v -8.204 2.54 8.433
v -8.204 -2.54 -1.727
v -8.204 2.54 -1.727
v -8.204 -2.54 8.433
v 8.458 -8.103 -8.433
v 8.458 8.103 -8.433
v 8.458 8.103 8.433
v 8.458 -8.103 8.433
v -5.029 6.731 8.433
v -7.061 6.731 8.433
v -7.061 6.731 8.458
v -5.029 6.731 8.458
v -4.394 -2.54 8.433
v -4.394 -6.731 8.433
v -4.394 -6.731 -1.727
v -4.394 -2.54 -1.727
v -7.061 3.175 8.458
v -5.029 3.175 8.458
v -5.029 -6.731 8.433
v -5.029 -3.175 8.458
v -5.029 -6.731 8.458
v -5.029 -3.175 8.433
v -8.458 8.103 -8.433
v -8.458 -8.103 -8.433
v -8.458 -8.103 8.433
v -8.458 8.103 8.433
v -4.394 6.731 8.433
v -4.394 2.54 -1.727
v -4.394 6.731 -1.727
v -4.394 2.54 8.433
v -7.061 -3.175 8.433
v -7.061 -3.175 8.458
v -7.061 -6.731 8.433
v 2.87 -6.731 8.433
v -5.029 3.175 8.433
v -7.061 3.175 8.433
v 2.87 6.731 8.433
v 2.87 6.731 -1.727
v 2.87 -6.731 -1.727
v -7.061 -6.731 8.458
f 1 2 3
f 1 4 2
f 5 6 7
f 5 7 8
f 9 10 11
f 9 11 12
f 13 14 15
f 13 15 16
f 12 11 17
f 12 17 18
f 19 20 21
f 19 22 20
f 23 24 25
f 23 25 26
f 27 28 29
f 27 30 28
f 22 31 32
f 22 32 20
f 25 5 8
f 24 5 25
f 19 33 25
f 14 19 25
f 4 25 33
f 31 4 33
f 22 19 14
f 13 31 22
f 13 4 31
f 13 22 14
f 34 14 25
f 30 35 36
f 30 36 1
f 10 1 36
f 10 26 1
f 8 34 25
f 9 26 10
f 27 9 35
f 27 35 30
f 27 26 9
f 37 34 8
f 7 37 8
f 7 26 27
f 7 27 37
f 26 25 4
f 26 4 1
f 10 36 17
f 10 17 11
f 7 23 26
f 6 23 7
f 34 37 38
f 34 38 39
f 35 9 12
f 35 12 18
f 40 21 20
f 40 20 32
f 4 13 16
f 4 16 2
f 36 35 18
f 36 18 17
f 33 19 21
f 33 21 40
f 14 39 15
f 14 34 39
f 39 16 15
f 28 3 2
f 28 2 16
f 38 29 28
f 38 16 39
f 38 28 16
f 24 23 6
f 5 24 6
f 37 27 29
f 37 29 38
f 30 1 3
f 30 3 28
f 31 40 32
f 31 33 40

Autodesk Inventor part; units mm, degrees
ref_plane "YZ Plane" through (0, 0, 0) normal (1, 0, 0) x (0, 1, 0)
ref_plane "XZ Plane" through (0, 0, 0) normal (0, 1, 0) x (-1, 0, 0)
ref_plane "XY Plane" through (0, 0, 0) normal (0, 0, 1) x (1, 0, 0)
sketch "Sketch1" plane through (0, 0, 0) normal (0, 0, 1) x (1, 0, 0)
  line L0 (-8.4582, 8.1026) -> (8.4582, 8.1026)
  line L1 (8.4582, 8.1026) -> (8.4582, -8.1026)
  line L2 (8.4582, -8.1026) -> (-8.4582, -8.1026)
  line L3 (-8.4582, -8.1026) -> (-8.4582, 8.1026)
  line L4 (0, 0) -> (0, 8.1026) construction
  line L5 (0, 0) -> (0, -8.1026) construction
  line L6 (0, 0) -> (-8.4582, 0) construction
  line L7 (0, 0) -> (8.4582, 0) construction
  dimension "d0" = 16.9164
  dimension "d1" = 16.2052
extrude "Extrusion1" add sketch "Sketch1" along normal mid plane 16.8656
sketch "Sketch2" plane through (0, 0, 8.4328) normal (0, 0, 1) x (1, 0, 0)
  line L0 (8.4582, 8.1026) -> (8.4582, -8.1026) projected
  line L1 (-8.4582, 8.1026) -> (8.4582, 8.1026) projected
  line L2 (-8.4582, -8.1026) -> (-8.4582, 8.1026) projected
  line L3 (8.4582, -8.1026) -> (-8.4582, -8.1026) projected
  line L4 (-8.2042, -2.54) -> (-8.2042, 2.54)
  line L5 (-8.2042, 2.54) -> (-4.3942, 2.54)
  line L6 (-4.3942, 2.54) -> (-4.3942, 6.731)
  line L7 (-4.3942, 6.731) -> (2.8702, 6.731)
  line L8 (2.8702, 6.731) -> (2.8702, -6.731)
  line L9 (2.8702, -6.731) -> (-4.3942, -6.731)
  line L10 (-4.3942, -6.731) -> (-4.3942, -2.54)
  line L11 (-4.3942, -2.54) -> (-8.2042, -2.54)
  line L12 (0, 8.1026) -> (0, -8.1026) construction
  line L13 (-8.4582, 0) -> (8.4582, 0) construction
  dimension "d4" = 13.462
  dimension "d5" = 0.254
  dimension "d6" = 3.81
  dimension "d7" = 5.08
  dimension "d8" = 5.588
extrude "Extrusion2" cut sketch "Sketch2" against normal blind 10.16 contours L4 L5 L6 L7 L8 L9 L10 L11
sketch "Sketch3" plane through (0, 0, 8.4328) normal (0, 0, 1) x (1, 0, 0)
  line L0 (-8.2042, 2.54) -> (-4.3942, 2.54) projected
  line L1 (-4.3942, 2.54) -> (-4.3942, 6.731) projected
  line L2 (-4.3942, 6.731) -> (2.8702, 6.731) projected
  line L3 (-7.0612, 6.731) -> (-5.0292, 6.731)
  line L4 (-5.0292, 6.731) -> (-5.0292, 3.175)
  line L5 (-5.0292, 3.175) -> (-7.0612, 3.175)
  line L6 (-7.0612, 3.175) -> (-7.0612, 6.731)
  dimension "d11" = 0.635
  dimension "d12" = 0.635
  dimension "d13" = 2.032
extrude "Extrusion3" add sketch "Sketch3" along normal blind 0.0254
mirror "Mirror1" about plane through (0, 0, 0) normal (0, 1, 0) of "Extrusion3"
properties part number "cRIO-FRC CAT5" material "ABS Plastic"
